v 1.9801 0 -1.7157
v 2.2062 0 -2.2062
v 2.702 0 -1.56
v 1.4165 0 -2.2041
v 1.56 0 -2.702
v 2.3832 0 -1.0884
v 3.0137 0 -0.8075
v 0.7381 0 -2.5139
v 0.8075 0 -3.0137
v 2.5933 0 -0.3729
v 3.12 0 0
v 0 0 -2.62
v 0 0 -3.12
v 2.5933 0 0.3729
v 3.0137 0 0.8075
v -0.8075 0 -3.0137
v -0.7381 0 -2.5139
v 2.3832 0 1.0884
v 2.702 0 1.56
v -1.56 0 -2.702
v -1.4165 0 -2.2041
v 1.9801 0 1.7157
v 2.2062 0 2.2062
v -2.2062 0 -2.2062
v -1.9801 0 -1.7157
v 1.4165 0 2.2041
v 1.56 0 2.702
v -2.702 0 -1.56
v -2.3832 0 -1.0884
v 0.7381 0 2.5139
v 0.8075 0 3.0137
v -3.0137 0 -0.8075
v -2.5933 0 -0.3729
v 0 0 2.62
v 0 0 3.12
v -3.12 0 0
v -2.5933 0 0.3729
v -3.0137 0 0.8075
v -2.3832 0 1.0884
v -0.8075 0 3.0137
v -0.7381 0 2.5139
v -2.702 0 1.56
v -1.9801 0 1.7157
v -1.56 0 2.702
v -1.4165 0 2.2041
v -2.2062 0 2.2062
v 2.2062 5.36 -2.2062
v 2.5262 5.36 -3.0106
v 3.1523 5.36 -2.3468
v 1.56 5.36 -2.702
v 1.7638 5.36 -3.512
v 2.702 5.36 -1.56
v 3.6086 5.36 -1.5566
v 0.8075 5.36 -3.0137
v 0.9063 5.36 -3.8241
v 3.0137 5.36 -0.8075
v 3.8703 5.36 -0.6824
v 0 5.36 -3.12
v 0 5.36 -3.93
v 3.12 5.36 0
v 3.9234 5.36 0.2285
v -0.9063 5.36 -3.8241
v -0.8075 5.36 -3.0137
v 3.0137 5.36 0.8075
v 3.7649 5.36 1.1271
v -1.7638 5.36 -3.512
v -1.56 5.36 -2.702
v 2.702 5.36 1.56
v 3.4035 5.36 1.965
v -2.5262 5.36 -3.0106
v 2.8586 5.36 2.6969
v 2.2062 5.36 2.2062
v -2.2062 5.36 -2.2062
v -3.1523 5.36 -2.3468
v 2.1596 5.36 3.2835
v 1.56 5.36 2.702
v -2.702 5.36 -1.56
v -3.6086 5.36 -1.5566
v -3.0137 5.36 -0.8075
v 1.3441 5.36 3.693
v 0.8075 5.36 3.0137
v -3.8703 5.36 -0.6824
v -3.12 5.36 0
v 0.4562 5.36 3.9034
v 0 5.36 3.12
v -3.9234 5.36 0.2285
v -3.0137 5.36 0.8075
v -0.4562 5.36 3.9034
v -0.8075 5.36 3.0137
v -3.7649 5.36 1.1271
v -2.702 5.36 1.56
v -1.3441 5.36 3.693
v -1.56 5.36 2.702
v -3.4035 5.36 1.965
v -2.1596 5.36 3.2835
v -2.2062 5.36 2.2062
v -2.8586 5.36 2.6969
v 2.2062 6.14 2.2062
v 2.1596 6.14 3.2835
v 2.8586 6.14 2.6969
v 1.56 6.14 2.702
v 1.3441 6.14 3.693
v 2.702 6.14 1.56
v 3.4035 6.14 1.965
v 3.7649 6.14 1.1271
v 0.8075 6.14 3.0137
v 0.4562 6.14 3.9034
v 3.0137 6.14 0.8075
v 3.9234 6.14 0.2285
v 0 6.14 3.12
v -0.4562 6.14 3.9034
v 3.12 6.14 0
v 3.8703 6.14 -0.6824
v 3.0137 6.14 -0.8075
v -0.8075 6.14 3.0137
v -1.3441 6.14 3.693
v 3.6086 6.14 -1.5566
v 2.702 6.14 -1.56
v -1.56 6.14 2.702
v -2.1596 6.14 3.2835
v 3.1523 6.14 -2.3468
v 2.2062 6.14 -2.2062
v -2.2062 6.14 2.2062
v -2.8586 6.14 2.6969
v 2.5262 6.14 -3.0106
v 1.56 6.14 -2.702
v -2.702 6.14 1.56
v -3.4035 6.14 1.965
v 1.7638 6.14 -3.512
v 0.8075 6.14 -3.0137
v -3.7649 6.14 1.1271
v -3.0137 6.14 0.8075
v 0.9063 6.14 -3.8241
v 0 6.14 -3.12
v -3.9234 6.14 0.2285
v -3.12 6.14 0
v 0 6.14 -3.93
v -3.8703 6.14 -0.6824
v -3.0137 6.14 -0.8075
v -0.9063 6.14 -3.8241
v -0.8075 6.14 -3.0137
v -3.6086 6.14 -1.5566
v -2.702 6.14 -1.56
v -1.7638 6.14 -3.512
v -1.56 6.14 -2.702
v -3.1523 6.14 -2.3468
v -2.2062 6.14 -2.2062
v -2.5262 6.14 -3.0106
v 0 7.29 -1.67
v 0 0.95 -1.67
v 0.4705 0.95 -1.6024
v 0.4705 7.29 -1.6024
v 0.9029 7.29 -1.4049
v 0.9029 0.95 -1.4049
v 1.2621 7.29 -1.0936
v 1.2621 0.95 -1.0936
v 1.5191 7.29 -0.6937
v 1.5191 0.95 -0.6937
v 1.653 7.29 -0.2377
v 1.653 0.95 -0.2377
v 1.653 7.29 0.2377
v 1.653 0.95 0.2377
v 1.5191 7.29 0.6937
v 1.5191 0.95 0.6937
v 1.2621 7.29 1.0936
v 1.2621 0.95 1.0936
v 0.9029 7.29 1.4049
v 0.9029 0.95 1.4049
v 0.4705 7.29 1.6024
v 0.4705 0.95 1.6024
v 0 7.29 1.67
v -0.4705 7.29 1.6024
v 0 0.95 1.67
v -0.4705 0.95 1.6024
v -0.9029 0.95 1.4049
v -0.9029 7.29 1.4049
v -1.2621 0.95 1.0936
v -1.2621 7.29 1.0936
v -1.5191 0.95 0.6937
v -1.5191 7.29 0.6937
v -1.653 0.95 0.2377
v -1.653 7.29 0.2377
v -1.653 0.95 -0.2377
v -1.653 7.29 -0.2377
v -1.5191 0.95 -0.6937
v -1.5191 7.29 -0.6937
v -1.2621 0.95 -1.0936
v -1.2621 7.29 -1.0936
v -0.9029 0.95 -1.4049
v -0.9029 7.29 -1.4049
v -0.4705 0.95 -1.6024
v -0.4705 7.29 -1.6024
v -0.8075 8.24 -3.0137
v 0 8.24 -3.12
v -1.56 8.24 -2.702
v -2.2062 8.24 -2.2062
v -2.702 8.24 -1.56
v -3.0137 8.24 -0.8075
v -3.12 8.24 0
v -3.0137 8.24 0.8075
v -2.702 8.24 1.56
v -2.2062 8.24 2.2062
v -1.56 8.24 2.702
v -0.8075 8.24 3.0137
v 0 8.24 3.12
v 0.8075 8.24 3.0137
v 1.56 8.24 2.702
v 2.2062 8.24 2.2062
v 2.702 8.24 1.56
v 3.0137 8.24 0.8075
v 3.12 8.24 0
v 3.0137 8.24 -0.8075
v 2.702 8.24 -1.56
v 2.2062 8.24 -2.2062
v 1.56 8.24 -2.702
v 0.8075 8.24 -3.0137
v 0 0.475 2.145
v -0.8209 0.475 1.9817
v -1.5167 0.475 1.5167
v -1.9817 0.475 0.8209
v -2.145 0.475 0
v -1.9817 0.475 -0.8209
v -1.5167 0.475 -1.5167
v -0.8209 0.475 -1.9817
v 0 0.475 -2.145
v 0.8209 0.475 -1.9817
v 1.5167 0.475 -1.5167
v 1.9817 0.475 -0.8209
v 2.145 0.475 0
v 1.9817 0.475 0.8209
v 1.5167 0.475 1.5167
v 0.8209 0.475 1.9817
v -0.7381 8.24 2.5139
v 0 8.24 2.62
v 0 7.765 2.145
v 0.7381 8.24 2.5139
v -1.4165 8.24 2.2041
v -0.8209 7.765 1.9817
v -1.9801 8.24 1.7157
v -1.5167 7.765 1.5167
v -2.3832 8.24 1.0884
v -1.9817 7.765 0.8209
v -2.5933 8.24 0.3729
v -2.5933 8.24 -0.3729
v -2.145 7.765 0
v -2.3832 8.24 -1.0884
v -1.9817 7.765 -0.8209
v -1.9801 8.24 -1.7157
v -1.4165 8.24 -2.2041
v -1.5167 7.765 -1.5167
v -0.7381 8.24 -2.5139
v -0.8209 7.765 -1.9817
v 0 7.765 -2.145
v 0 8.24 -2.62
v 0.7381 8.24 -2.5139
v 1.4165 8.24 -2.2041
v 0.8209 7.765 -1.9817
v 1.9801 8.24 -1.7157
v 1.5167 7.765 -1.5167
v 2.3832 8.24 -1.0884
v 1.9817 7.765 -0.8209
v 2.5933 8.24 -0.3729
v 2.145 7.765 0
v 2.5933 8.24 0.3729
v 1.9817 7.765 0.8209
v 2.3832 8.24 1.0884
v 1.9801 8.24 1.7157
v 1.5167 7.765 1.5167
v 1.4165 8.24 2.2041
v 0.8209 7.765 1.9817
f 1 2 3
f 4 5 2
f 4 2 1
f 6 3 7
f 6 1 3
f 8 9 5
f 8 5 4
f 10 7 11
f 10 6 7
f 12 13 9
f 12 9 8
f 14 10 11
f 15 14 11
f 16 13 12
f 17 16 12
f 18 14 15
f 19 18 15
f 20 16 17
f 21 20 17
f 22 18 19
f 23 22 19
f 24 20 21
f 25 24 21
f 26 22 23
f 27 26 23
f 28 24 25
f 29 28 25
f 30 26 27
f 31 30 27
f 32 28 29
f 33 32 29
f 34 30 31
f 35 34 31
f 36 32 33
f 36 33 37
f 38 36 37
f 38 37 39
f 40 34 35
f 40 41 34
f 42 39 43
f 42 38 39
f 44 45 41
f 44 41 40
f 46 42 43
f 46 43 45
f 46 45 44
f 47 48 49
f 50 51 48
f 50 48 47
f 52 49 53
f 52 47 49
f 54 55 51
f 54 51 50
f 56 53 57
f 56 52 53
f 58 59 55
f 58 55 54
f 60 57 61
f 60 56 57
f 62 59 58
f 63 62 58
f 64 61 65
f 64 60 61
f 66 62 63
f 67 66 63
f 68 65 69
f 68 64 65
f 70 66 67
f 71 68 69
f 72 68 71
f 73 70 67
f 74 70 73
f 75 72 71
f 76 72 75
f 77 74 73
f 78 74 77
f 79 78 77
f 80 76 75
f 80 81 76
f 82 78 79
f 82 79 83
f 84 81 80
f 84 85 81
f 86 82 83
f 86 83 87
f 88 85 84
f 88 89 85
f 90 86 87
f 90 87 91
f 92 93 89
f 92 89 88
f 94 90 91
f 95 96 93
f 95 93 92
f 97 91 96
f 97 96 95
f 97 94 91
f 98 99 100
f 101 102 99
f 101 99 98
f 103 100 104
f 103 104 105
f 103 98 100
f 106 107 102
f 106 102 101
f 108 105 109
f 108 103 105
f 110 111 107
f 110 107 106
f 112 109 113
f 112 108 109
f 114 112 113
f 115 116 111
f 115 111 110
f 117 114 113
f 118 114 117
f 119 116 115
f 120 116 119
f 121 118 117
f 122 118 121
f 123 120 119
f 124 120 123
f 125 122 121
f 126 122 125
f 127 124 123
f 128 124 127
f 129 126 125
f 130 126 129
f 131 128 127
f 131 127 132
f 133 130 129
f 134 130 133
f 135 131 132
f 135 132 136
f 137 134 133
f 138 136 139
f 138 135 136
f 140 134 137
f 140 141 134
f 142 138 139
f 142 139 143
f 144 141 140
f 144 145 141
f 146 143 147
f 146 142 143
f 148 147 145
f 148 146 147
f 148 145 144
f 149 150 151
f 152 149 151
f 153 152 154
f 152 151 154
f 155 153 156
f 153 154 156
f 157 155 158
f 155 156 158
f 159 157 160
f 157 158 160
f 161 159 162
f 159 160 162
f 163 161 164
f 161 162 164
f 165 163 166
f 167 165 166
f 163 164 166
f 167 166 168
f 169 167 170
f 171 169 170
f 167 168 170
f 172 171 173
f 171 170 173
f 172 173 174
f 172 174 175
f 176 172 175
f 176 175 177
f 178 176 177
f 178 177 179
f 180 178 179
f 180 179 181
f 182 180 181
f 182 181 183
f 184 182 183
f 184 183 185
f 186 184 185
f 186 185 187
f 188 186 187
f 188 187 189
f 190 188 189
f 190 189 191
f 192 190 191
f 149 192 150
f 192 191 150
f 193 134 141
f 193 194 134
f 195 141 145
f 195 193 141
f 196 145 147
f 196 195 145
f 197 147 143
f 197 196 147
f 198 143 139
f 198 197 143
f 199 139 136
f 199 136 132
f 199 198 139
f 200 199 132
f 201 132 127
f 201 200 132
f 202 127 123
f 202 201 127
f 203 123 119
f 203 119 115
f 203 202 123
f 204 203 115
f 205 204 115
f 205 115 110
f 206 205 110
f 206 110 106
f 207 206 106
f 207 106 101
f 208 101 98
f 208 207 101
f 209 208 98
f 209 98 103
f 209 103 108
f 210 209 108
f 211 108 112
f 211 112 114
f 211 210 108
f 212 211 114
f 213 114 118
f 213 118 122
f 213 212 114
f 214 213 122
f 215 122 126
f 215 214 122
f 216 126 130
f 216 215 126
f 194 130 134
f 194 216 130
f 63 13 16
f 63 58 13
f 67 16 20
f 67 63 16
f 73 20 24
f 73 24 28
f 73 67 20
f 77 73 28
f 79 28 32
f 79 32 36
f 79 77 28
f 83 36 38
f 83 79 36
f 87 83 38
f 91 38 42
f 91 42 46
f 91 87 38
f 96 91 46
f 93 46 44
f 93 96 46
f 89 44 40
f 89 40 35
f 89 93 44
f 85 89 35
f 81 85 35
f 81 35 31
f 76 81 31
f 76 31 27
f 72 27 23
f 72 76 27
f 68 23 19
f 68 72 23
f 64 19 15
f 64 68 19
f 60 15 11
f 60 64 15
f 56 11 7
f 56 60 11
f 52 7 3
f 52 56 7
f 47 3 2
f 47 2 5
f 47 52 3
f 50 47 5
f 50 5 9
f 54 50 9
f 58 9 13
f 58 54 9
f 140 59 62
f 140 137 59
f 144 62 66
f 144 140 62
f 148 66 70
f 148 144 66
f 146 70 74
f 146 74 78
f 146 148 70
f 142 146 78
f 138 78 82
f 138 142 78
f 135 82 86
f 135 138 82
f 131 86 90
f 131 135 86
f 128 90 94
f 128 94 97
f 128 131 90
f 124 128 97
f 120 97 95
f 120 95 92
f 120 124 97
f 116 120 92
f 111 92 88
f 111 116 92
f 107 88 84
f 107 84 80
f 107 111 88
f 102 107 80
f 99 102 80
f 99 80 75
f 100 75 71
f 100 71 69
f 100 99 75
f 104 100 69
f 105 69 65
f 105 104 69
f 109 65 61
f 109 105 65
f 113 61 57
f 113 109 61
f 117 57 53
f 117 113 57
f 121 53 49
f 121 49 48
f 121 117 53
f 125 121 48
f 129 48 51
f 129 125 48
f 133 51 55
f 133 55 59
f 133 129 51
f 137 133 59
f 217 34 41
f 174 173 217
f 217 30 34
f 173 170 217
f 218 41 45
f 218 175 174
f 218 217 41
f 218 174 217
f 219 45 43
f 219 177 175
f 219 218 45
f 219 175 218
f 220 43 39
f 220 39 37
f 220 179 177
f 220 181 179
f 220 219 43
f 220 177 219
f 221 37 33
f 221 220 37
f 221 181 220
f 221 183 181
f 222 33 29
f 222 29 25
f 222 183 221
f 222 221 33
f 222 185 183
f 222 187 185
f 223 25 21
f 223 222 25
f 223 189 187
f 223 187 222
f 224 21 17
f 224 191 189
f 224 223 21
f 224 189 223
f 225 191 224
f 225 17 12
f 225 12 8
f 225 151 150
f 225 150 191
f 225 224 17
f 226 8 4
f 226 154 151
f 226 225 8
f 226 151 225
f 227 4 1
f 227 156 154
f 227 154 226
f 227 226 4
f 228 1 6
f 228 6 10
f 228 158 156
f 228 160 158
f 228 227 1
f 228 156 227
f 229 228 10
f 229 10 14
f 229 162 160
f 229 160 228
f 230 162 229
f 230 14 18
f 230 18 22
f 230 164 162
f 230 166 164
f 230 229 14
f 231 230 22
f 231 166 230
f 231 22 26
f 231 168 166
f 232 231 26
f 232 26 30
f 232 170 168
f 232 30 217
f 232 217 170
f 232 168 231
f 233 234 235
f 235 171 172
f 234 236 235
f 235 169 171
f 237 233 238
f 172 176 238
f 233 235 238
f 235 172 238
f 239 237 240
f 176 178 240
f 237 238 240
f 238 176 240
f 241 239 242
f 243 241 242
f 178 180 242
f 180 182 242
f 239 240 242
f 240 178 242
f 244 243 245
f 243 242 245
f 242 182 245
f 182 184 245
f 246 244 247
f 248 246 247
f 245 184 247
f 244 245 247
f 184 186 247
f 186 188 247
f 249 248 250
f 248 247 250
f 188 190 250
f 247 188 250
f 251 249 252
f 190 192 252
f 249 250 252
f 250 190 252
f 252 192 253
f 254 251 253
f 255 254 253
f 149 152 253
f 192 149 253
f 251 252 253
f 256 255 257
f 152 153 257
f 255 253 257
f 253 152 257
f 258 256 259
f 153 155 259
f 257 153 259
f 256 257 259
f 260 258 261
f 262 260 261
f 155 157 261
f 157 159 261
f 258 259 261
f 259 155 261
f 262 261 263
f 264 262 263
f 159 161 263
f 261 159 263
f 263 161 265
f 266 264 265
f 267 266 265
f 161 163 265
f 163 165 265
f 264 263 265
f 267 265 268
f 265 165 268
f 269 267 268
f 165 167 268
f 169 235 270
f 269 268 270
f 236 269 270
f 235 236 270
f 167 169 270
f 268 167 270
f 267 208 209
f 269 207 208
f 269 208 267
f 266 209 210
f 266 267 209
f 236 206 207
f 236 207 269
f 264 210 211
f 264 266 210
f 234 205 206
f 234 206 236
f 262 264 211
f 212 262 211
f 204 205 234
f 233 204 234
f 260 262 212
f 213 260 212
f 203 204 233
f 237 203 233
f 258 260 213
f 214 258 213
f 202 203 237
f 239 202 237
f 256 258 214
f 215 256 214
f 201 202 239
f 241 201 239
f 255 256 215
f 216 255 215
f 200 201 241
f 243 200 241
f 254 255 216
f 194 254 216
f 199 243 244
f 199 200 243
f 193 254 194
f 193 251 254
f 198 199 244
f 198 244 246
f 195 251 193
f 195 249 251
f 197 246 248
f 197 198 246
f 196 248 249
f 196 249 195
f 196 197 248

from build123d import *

# Parameters (mm, degrees)
SKETCH_2_R          = 1.67
CUT_EXTRUDE_1_DEPTH = 10.939185077


with BuildPart() as part:
    # 草图1 → 旋转1 (revolve)
    with BuildSketch(Plane.XY, mode=Mode.PRIVATE) as revolve_1_sk:
        Polygon((0, 0), (3.12, 0), (3.12, 5.36), (3.93, 5.36), (3.93, 6.14), (3.12, 6.14), (3.12, 8.24), (0, 8.24), align=None)
    revolve(revolve_1_sk.sketch.rotate(Axis((0, 0, 0), (0, 1, 0)), 90), axis=Axis((0, 0, 0), (0, 1, 0)))

    # 草图2 → 切除-拉伸1 (cut, through all)
    with BuildSketch(Plane.XZ):
        with Locations(Location((0, 0, 0), (0, 0, 270))):
            Circle(SKETCH_2_R)
    extrude(amount=-CUT_EXTRUDE_1_DEPTH, mode=Mode.SUBTRACT)

    # 草图4 → 切除-旋转1 (revolve, cut)
    with BuildSketch(Plane.XY, mode=Mode.PRIVATE) as cut_revolve_1_sk:
        Polygon((2.62, 0), (1.67, 0.95), (0, 0.95), (0, 0), align=None)
        Polygon((2.62, 8.24), (1.67, 7.29), (0, 7.29), (0, 8.24), align=None)
    revolve(cut_revolve_1_sk.sketch.rotate(Axis((0, 0, 0), (0, -1, 0)), 90), axis=Axis((0, 0, 0), (0, -1, 0)), mode=Mode.SUBTRACT)


solid = part.part
